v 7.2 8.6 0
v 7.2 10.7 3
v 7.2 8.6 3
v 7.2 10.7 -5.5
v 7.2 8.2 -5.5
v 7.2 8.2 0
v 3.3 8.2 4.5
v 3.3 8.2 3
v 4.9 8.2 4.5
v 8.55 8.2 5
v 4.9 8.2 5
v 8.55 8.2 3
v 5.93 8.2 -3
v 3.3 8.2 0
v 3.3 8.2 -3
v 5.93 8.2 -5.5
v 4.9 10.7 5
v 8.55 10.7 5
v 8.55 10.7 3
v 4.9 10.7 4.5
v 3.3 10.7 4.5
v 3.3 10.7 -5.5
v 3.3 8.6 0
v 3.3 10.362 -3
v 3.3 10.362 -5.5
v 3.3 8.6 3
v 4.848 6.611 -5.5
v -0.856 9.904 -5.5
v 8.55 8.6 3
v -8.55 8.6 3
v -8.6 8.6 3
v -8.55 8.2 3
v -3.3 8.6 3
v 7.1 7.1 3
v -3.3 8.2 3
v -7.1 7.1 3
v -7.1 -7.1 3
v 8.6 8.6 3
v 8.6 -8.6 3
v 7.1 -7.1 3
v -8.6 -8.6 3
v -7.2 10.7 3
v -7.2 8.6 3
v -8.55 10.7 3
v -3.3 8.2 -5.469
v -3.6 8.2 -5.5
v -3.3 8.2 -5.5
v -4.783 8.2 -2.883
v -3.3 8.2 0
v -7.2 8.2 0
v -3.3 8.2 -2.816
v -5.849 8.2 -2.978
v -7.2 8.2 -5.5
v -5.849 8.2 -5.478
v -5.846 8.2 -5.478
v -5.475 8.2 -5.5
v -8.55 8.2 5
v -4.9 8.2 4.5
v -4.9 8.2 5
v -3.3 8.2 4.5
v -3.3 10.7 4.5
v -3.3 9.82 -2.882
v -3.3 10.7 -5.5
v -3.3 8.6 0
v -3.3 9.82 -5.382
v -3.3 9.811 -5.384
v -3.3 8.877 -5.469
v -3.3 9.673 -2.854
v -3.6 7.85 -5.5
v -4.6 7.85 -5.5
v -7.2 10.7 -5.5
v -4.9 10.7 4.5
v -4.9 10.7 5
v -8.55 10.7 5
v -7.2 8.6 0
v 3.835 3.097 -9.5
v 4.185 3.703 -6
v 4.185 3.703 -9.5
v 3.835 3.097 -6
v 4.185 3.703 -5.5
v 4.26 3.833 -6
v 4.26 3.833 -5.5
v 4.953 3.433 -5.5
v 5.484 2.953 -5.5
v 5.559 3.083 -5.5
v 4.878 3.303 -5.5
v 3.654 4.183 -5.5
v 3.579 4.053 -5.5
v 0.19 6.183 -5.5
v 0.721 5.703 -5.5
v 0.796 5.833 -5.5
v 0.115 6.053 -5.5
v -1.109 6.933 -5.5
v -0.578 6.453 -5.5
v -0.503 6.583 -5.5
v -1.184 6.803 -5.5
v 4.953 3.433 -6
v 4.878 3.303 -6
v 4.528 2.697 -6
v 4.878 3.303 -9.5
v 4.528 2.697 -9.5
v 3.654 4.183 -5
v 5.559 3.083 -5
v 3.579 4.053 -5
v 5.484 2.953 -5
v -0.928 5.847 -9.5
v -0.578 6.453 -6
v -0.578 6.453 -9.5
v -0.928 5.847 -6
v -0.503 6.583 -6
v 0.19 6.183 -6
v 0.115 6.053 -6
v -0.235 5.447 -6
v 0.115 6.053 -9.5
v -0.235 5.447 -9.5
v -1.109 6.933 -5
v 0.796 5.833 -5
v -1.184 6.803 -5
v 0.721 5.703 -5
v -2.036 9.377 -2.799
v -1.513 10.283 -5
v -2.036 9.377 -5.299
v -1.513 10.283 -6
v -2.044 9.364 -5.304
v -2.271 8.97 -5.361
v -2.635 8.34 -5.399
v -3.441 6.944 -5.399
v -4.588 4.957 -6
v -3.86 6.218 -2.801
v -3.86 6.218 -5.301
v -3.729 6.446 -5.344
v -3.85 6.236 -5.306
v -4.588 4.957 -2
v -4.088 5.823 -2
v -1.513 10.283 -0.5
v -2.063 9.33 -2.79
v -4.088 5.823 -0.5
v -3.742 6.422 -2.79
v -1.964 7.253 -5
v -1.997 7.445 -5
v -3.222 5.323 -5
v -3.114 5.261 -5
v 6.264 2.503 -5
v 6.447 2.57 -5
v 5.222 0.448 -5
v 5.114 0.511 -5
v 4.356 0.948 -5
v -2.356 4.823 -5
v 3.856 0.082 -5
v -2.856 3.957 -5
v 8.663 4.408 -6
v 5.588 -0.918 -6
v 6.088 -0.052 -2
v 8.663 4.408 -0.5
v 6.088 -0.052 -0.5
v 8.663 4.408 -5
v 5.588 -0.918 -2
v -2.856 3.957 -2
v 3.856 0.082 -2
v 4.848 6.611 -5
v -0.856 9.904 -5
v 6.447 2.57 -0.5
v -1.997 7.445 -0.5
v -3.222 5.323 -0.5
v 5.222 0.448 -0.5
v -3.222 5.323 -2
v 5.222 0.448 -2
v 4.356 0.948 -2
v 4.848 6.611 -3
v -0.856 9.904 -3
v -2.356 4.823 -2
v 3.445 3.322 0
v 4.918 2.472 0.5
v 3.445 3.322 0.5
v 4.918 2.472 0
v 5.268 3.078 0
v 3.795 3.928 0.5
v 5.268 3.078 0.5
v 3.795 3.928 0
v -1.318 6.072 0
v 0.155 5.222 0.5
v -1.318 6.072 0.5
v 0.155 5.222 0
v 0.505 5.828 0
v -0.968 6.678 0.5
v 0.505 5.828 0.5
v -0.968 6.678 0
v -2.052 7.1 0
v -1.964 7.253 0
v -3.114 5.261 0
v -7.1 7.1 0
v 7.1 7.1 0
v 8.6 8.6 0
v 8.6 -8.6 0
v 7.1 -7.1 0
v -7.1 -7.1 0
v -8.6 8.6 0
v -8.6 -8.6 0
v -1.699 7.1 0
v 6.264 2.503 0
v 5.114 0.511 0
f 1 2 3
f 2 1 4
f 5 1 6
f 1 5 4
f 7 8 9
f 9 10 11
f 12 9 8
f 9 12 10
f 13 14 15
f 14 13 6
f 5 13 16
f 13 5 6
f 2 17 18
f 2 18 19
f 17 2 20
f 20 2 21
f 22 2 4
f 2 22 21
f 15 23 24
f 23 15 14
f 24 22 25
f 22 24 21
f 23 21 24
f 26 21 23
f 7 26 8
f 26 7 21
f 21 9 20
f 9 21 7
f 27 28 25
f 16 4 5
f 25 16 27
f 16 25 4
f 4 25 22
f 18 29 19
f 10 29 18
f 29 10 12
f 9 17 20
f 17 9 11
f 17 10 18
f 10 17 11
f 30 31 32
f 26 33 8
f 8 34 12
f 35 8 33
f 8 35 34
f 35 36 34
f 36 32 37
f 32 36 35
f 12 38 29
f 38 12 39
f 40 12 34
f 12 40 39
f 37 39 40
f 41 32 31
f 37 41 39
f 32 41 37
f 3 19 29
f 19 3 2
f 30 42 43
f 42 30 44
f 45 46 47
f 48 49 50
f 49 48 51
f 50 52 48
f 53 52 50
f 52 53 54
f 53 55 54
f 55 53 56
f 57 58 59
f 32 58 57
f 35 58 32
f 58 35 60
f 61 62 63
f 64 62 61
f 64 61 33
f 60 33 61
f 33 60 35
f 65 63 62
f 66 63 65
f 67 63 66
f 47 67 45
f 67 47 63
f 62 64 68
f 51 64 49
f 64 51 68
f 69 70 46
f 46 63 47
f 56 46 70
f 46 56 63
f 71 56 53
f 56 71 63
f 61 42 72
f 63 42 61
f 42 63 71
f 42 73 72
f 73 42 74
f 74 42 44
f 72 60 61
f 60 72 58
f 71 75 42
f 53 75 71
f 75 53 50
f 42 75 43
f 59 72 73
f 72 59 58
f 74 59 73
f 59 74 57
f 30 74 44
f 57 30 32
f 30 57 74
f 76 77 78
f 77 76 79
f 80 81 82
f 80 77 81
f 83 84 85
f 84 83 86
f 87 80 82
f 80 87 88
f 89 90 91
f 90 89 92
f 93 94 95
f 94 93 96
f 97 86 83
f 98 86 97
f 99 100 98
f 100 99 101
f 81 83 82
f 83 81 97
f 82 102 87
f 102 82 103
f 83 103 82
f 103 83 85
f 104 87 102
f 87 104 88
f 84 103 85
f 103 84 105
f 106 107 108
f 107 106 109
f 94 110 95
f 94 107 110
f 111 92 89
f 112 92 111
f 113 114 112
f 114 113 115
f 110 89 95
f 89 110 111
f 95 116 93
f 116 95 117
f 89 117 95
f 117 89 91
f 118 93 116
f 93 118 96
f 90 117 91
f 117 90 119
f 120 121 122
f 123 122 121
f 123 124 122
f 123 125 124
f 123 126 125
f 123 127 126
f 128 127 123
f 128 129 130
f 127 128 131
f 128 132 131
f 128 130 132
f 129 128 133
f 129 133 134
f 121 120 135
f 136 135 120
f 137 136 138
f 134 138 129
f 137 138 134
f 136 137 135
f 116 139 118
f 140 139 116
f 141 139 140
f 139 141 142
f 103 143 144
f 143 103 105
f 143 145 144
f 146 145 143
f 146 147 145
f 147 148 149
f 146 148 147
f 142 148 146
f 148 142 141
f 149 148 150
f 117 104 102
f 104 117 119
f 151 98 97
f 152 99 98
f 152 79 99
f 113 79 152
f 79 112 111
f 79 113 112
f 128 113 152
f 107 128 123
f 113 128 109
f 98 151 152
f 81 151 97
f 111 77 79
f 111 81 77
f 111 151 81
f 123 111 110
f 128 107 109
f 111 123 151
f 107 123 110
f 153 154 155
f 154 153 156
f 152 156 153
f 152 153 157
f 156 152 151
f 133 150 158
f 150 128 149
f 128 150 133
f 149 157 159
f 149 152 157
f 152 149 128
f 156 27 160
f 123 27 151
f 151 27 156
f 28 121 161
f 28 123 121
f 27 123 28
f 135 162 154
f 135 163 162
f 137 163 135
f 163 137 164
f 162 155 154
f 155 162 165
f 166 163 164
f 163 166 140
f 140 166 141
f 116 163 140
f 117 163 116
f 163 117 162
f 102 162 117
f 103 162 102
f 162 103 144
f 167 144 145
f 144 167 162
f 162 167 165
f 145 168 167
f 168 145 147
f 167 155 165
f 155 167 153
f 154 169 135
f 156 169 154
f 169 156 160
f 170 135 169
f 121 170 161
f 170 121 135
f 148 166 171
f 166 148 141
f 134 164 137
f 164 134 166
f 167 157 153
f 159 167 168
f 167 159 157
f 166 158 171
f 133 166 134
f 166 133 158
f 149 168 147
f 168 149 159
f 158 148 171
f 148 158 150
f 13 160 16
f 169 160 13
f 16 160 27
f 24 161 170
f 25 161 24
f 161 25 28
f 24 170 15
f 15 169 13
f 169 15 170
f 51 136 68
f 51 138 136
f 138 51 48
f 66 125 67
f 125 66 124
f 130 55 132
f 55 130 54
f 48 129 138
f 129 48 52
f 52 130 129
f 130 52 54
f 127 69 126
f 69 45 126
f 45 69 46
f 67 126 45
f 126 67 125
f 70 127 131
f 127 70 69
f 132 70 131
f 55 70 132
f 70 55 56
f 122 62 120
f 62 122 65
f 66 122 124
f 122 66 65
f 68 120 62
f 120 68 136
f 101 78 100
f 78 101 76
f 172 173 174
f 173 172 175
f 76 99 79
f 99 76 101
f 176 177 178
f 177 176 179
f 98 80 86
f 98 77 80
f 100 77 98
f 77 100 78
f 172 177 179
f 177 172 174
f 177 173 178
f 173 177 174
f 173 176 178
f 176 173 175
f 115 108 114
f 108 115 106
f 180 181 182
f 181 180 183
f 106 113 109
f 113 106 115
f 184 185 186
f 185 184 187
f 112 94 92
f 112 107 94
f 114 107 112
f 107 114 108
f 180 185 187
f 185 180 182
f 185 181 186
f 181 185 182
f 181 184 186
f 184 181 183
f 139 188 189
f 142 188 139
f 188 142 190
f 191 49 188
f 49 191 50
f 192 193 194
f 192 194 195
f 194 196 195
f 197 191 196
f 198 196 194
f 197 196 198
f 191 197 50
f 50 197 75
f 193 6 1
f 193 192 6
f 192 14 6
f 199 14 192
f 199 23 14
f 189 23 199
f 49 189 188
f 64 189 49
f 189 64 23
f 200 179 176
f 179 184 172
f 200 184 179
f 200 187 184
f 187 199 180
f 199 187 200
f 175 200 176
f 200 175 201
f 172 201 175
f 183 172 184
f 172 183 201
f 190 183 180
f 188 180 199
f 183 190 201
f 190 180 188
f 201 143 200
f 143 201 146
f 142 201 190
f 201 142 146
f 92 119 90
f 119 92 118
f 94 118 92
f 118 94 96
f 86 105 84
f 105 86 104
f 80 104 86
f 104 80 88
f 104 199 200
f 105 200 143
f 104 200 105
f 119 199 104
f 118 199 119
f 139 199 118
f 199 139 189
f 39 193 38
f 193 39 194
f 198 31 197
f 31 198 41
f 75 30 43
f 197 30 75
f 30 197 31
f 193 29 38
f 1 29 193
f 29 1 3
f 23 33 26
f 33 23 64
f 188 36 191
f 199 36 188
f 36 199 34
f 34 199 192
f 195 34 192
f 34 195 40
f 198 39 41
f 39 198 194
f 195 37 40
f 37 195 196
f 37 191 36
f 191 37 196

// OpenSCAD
union () {
  translate ([0, 10.7, -5.5]) {
    rotate (a=90.0, v=[1, 0, 0]) {
      union () {
        translate ([3.3, 0, 0]) {
          cube ([3.9, 10, 2.5]);
        }
        translate ([4.8999999999999995, 8.5, 0]) {
          cube ([3.65, 2, 2.5]);
        }
        translate ([-3.3, 0, 0]) {
          mirror ([1, 0, ]) {
            cube ([3.9, 10, 2.5]);
          }
        }
        translate ([-4.8999999999999995, 8.5, 0]) {
          mirror ([1, 0, ]) {
            cube ([3.65, 2, 2.5]);
          }
        }
      }
    }
  }
  translate ([0, 6.85, -5.5]) {
    rotate (a=180.0, v=[0, 0, 1]) {
      union () {
        union () {
          translate ([-3, 0.5, 2.75]) {
            rotate (a=-30.00000000000001, v=[0, 0, 1]) {
              translate ([0, 4, 0]) {
                union () {
                  linear_extrude (height=4.5, center=true){
                    union () {
                      translate ([4.875, -4.15, ]) {
                        square ([1, 4.15]);
                      }
                      translate ([-4.875, -4.15, ]) {
                        mirror ([1, 0, ]) {
                          square ([1, 4.15]);
                        }
                      }
                      translate ([0, -3.8000000000000003, ]) {
                        square ([11.75, 2.7], center=true);
                      }
                    }
                  }
                  translate ([0, 0, -0.75]) {
                    linear_extrude (height=3, center=true){
                      union () {
                        translate ([-5.875, 0, ]) {
                          polygon (points=[[0, 0], [2, 0], [2, 1], [0, 1]]);
                        }
                        translate ([5.875, 0, ]) {
                          mirror ([1, 0, ]) {
                            polygon (points=[[0, 0], [2, 0], [2, 1], [0, 1]]);
                          }
                        }
                      }
                    }
                  }
                  difference () {
                    translate ([0, -2.075, -2.75]) {
                      cube ([11.75, 6.15, 1], center=true);
                    }
                    translate ([0, -2.45, 0]) {
                      union () {
                        translate ([-2.75, 0, -6.75]) {
                          translate ([0, 0.35, 0]) {
                            union () {
                              translate ([0, 0, 2]) {
                                cube ([0.8, 0.7, 4], center=true);
                              }
                              translate ([0, 0, 6.5]) {
                                cube ([2.2, 0.7, 5], center=true);
                              }
                              translate ([0, 0, 9.5]) {
                                cube ([1.7, 0.7, 1], center=true);
                              }
                            }
                          }
                        }
                        translate ([2.75, 0, -6.75]) {
                          translate ([0, 0.35, 0]) {
                            union () {
                              translate ([0, 0, 2]) {
                                cube ([0.8, 0.7, 4], center=true);
                              }
                              translate ([0, 0, 6.5]) {
                                cube ([2.2, 0.7, 5], center=true);
                              }
                              translate ([0, 0, 9.5]) {
                                cube ([1.7, 0.7, 1], center=true);
                              }
                            }
                          }
                        }
                      }
                    }
                  }
                }
              }
            }
          }
          translate ([0, -2.6, 8.5]) {
            rotate (a=90.0, v=[1, 0, 0]) {
              linear_extrude (height=2.35, center=true){
                union () {
                  translate ([5.1, 0, 0]) {
                    polygon (points=[[0, 1.75], [3.4, 0], [0, 0]]);
                  }
                  translate ([-5.1, 0, 0]) {
                    mirror ([1, 0, ]) {
                      polygon (points=[[0, 1.75], [3.4, 0], [0, 0]]);
                    }
                  }
                  translate ([5.1, 0, 0]) {
                    translate ([0, -8.4, ]) {
                      square ([1.8, 8.4]);
                    }
                  }
                  translate ([-5.1, 0, 0]) {
                    mirror ([1, 0, ]) {
                      translate ([0, -8.4, ]) {
                        square ([1.8, 8.4]);
                      }
                    }
                  }
                }
              }
            }
          }
          hull () {
            translate ([-1.5999999999999996, -1.2, 1.25]) {
              rotate (a=-30.00000000000001, v=[0, 0, 1]) {
                cube ([7, 0.1, 2.5], center=true);
              }
            }
            translate ([-5.1, -2.6, 1.25]) {
              cube ([2, 2, 2.5], center=true);
            }
          }
          hull () {
            translate ([-3, 0.5, 2.75]) {
              rotate (a=-30.00000000000001, v=[0, 0, 1]) {
                translate ([0, 4, 0]) {
                  translate ([5.05, -2.25, -1.25]) {
                    cube ([0.1, 4, 2.5], center=true);
                  }
                }
              }
            }
            translate ([4.1, -1.5, 1.25]) {
              cube ([1, 1, 2.5], center=true);
            }
            translate ([5.6, -2.6, 1.25]) {
              cube ([1, 2, 2.5], center=true);
            }
          }
        }
        translate ([-3, 0.5, 2.75]) {
          rotate (a=-30.00000000000001, v=[0, 0, 1]) {
            translate ([0, 4, 0]) {
              translate ([0, -2.3, 0]) {
                union () {
                  union () {
                    translate ([-2.75, 0, -6.75]) {
                      translate ([0, 0.35, 0]) {
                        union () {
                          translate ([0, 0, 2]) {
                            cube ([0.8, 0.7, 4], center=true);
                          }
                          translate ([0, 0, 6.5]) {
                            cube ([2.2, 0.7, 5], center=true);
                          }
                          translate ([0, 0, 9.5]) {
                            cube ([1.7, 0.7, 1], center=true);
                          }
                        }
                      }
                    }
                    translate ([2.75, 0, -6.75]) {
                      translate ([0, 0.35, 0]) {
                        union () {
                          translate ([0, 0, 2]) {
                            cube ([0.8, 0.7, 4], center=true);
                          }
                          translate ([0, 0, 6.5]) {
                            cube ([2.2, 0.7, 5], center=true);
                          }
                          translate ([0, 0, 9.5]) {
                            cube ([1.7, 0.7, 1], center=true);
                          }
                        }
                      }
                    }
                  }
                  difference () {
                    translate ([0, 1.15, 0]) {
                      cube ([9.5, 2.3, 5.5], center=true);
                    }
                    union () {
                      translate ([-2.75, 0, -6.75]) {
                        translate ([0, 0.35, 0]) {
                          union () {
                            translate ([0, 0, 2]) {
                              cube ([0.8, 0.7, 4], center=true);
                            }
                            translate ([0, 0, 6.5]) {
                              cube ([2.2, 0.7, 5], center=true);
                            }
                            translate ([0, 0, 9.5]) {
                              cube ([1.7, 0.7, 1], center=true);
                            }
                          }
                        }
                      }
                      translate ([2.75, 0, -6.75]) {
                        translate ([0, 0.35, 0]) {
                          union () {
                            translate ([0, 0, 2]) {
                              cube ([0.8, 0.7, 4], center=true);
                            }
                            translate ([0, 0, 6.5]) {
                              cube ([2.2, 0.7, 5], center=true);
                            }
                            translate ([0, 0, 9.5]) {
                              cube ([1.7, 0.7, 1], center=true);
                            }
                          }
                        }
                      }
                    }
                  }
                }
              }
            }
          }
        }
      }
    }
  }
  difference () {
    union () {
      union () {
        translate ([0, 7.85, 3/2]) {
          cube ([17.2, 1.5, 3], center=true);
        }
        translate ([7.85, 0, 3/2]) {
          cube ([1.5, 17.2, 3], center=true);
        }
      }
      mirror ([0, 1, 0]) {
        mirror ([1, 0, 0]) {
          union () {
            translate ([0, 7.85, 3/2]) {
              cube ([17.2, 1.5, 3], center=true);
            }
            translate ([7.85, 0, 3/2]) {
              cube ([1.5, 17.2, 3], center=true);
            }
          }
        }
      }
    }
  }
}
